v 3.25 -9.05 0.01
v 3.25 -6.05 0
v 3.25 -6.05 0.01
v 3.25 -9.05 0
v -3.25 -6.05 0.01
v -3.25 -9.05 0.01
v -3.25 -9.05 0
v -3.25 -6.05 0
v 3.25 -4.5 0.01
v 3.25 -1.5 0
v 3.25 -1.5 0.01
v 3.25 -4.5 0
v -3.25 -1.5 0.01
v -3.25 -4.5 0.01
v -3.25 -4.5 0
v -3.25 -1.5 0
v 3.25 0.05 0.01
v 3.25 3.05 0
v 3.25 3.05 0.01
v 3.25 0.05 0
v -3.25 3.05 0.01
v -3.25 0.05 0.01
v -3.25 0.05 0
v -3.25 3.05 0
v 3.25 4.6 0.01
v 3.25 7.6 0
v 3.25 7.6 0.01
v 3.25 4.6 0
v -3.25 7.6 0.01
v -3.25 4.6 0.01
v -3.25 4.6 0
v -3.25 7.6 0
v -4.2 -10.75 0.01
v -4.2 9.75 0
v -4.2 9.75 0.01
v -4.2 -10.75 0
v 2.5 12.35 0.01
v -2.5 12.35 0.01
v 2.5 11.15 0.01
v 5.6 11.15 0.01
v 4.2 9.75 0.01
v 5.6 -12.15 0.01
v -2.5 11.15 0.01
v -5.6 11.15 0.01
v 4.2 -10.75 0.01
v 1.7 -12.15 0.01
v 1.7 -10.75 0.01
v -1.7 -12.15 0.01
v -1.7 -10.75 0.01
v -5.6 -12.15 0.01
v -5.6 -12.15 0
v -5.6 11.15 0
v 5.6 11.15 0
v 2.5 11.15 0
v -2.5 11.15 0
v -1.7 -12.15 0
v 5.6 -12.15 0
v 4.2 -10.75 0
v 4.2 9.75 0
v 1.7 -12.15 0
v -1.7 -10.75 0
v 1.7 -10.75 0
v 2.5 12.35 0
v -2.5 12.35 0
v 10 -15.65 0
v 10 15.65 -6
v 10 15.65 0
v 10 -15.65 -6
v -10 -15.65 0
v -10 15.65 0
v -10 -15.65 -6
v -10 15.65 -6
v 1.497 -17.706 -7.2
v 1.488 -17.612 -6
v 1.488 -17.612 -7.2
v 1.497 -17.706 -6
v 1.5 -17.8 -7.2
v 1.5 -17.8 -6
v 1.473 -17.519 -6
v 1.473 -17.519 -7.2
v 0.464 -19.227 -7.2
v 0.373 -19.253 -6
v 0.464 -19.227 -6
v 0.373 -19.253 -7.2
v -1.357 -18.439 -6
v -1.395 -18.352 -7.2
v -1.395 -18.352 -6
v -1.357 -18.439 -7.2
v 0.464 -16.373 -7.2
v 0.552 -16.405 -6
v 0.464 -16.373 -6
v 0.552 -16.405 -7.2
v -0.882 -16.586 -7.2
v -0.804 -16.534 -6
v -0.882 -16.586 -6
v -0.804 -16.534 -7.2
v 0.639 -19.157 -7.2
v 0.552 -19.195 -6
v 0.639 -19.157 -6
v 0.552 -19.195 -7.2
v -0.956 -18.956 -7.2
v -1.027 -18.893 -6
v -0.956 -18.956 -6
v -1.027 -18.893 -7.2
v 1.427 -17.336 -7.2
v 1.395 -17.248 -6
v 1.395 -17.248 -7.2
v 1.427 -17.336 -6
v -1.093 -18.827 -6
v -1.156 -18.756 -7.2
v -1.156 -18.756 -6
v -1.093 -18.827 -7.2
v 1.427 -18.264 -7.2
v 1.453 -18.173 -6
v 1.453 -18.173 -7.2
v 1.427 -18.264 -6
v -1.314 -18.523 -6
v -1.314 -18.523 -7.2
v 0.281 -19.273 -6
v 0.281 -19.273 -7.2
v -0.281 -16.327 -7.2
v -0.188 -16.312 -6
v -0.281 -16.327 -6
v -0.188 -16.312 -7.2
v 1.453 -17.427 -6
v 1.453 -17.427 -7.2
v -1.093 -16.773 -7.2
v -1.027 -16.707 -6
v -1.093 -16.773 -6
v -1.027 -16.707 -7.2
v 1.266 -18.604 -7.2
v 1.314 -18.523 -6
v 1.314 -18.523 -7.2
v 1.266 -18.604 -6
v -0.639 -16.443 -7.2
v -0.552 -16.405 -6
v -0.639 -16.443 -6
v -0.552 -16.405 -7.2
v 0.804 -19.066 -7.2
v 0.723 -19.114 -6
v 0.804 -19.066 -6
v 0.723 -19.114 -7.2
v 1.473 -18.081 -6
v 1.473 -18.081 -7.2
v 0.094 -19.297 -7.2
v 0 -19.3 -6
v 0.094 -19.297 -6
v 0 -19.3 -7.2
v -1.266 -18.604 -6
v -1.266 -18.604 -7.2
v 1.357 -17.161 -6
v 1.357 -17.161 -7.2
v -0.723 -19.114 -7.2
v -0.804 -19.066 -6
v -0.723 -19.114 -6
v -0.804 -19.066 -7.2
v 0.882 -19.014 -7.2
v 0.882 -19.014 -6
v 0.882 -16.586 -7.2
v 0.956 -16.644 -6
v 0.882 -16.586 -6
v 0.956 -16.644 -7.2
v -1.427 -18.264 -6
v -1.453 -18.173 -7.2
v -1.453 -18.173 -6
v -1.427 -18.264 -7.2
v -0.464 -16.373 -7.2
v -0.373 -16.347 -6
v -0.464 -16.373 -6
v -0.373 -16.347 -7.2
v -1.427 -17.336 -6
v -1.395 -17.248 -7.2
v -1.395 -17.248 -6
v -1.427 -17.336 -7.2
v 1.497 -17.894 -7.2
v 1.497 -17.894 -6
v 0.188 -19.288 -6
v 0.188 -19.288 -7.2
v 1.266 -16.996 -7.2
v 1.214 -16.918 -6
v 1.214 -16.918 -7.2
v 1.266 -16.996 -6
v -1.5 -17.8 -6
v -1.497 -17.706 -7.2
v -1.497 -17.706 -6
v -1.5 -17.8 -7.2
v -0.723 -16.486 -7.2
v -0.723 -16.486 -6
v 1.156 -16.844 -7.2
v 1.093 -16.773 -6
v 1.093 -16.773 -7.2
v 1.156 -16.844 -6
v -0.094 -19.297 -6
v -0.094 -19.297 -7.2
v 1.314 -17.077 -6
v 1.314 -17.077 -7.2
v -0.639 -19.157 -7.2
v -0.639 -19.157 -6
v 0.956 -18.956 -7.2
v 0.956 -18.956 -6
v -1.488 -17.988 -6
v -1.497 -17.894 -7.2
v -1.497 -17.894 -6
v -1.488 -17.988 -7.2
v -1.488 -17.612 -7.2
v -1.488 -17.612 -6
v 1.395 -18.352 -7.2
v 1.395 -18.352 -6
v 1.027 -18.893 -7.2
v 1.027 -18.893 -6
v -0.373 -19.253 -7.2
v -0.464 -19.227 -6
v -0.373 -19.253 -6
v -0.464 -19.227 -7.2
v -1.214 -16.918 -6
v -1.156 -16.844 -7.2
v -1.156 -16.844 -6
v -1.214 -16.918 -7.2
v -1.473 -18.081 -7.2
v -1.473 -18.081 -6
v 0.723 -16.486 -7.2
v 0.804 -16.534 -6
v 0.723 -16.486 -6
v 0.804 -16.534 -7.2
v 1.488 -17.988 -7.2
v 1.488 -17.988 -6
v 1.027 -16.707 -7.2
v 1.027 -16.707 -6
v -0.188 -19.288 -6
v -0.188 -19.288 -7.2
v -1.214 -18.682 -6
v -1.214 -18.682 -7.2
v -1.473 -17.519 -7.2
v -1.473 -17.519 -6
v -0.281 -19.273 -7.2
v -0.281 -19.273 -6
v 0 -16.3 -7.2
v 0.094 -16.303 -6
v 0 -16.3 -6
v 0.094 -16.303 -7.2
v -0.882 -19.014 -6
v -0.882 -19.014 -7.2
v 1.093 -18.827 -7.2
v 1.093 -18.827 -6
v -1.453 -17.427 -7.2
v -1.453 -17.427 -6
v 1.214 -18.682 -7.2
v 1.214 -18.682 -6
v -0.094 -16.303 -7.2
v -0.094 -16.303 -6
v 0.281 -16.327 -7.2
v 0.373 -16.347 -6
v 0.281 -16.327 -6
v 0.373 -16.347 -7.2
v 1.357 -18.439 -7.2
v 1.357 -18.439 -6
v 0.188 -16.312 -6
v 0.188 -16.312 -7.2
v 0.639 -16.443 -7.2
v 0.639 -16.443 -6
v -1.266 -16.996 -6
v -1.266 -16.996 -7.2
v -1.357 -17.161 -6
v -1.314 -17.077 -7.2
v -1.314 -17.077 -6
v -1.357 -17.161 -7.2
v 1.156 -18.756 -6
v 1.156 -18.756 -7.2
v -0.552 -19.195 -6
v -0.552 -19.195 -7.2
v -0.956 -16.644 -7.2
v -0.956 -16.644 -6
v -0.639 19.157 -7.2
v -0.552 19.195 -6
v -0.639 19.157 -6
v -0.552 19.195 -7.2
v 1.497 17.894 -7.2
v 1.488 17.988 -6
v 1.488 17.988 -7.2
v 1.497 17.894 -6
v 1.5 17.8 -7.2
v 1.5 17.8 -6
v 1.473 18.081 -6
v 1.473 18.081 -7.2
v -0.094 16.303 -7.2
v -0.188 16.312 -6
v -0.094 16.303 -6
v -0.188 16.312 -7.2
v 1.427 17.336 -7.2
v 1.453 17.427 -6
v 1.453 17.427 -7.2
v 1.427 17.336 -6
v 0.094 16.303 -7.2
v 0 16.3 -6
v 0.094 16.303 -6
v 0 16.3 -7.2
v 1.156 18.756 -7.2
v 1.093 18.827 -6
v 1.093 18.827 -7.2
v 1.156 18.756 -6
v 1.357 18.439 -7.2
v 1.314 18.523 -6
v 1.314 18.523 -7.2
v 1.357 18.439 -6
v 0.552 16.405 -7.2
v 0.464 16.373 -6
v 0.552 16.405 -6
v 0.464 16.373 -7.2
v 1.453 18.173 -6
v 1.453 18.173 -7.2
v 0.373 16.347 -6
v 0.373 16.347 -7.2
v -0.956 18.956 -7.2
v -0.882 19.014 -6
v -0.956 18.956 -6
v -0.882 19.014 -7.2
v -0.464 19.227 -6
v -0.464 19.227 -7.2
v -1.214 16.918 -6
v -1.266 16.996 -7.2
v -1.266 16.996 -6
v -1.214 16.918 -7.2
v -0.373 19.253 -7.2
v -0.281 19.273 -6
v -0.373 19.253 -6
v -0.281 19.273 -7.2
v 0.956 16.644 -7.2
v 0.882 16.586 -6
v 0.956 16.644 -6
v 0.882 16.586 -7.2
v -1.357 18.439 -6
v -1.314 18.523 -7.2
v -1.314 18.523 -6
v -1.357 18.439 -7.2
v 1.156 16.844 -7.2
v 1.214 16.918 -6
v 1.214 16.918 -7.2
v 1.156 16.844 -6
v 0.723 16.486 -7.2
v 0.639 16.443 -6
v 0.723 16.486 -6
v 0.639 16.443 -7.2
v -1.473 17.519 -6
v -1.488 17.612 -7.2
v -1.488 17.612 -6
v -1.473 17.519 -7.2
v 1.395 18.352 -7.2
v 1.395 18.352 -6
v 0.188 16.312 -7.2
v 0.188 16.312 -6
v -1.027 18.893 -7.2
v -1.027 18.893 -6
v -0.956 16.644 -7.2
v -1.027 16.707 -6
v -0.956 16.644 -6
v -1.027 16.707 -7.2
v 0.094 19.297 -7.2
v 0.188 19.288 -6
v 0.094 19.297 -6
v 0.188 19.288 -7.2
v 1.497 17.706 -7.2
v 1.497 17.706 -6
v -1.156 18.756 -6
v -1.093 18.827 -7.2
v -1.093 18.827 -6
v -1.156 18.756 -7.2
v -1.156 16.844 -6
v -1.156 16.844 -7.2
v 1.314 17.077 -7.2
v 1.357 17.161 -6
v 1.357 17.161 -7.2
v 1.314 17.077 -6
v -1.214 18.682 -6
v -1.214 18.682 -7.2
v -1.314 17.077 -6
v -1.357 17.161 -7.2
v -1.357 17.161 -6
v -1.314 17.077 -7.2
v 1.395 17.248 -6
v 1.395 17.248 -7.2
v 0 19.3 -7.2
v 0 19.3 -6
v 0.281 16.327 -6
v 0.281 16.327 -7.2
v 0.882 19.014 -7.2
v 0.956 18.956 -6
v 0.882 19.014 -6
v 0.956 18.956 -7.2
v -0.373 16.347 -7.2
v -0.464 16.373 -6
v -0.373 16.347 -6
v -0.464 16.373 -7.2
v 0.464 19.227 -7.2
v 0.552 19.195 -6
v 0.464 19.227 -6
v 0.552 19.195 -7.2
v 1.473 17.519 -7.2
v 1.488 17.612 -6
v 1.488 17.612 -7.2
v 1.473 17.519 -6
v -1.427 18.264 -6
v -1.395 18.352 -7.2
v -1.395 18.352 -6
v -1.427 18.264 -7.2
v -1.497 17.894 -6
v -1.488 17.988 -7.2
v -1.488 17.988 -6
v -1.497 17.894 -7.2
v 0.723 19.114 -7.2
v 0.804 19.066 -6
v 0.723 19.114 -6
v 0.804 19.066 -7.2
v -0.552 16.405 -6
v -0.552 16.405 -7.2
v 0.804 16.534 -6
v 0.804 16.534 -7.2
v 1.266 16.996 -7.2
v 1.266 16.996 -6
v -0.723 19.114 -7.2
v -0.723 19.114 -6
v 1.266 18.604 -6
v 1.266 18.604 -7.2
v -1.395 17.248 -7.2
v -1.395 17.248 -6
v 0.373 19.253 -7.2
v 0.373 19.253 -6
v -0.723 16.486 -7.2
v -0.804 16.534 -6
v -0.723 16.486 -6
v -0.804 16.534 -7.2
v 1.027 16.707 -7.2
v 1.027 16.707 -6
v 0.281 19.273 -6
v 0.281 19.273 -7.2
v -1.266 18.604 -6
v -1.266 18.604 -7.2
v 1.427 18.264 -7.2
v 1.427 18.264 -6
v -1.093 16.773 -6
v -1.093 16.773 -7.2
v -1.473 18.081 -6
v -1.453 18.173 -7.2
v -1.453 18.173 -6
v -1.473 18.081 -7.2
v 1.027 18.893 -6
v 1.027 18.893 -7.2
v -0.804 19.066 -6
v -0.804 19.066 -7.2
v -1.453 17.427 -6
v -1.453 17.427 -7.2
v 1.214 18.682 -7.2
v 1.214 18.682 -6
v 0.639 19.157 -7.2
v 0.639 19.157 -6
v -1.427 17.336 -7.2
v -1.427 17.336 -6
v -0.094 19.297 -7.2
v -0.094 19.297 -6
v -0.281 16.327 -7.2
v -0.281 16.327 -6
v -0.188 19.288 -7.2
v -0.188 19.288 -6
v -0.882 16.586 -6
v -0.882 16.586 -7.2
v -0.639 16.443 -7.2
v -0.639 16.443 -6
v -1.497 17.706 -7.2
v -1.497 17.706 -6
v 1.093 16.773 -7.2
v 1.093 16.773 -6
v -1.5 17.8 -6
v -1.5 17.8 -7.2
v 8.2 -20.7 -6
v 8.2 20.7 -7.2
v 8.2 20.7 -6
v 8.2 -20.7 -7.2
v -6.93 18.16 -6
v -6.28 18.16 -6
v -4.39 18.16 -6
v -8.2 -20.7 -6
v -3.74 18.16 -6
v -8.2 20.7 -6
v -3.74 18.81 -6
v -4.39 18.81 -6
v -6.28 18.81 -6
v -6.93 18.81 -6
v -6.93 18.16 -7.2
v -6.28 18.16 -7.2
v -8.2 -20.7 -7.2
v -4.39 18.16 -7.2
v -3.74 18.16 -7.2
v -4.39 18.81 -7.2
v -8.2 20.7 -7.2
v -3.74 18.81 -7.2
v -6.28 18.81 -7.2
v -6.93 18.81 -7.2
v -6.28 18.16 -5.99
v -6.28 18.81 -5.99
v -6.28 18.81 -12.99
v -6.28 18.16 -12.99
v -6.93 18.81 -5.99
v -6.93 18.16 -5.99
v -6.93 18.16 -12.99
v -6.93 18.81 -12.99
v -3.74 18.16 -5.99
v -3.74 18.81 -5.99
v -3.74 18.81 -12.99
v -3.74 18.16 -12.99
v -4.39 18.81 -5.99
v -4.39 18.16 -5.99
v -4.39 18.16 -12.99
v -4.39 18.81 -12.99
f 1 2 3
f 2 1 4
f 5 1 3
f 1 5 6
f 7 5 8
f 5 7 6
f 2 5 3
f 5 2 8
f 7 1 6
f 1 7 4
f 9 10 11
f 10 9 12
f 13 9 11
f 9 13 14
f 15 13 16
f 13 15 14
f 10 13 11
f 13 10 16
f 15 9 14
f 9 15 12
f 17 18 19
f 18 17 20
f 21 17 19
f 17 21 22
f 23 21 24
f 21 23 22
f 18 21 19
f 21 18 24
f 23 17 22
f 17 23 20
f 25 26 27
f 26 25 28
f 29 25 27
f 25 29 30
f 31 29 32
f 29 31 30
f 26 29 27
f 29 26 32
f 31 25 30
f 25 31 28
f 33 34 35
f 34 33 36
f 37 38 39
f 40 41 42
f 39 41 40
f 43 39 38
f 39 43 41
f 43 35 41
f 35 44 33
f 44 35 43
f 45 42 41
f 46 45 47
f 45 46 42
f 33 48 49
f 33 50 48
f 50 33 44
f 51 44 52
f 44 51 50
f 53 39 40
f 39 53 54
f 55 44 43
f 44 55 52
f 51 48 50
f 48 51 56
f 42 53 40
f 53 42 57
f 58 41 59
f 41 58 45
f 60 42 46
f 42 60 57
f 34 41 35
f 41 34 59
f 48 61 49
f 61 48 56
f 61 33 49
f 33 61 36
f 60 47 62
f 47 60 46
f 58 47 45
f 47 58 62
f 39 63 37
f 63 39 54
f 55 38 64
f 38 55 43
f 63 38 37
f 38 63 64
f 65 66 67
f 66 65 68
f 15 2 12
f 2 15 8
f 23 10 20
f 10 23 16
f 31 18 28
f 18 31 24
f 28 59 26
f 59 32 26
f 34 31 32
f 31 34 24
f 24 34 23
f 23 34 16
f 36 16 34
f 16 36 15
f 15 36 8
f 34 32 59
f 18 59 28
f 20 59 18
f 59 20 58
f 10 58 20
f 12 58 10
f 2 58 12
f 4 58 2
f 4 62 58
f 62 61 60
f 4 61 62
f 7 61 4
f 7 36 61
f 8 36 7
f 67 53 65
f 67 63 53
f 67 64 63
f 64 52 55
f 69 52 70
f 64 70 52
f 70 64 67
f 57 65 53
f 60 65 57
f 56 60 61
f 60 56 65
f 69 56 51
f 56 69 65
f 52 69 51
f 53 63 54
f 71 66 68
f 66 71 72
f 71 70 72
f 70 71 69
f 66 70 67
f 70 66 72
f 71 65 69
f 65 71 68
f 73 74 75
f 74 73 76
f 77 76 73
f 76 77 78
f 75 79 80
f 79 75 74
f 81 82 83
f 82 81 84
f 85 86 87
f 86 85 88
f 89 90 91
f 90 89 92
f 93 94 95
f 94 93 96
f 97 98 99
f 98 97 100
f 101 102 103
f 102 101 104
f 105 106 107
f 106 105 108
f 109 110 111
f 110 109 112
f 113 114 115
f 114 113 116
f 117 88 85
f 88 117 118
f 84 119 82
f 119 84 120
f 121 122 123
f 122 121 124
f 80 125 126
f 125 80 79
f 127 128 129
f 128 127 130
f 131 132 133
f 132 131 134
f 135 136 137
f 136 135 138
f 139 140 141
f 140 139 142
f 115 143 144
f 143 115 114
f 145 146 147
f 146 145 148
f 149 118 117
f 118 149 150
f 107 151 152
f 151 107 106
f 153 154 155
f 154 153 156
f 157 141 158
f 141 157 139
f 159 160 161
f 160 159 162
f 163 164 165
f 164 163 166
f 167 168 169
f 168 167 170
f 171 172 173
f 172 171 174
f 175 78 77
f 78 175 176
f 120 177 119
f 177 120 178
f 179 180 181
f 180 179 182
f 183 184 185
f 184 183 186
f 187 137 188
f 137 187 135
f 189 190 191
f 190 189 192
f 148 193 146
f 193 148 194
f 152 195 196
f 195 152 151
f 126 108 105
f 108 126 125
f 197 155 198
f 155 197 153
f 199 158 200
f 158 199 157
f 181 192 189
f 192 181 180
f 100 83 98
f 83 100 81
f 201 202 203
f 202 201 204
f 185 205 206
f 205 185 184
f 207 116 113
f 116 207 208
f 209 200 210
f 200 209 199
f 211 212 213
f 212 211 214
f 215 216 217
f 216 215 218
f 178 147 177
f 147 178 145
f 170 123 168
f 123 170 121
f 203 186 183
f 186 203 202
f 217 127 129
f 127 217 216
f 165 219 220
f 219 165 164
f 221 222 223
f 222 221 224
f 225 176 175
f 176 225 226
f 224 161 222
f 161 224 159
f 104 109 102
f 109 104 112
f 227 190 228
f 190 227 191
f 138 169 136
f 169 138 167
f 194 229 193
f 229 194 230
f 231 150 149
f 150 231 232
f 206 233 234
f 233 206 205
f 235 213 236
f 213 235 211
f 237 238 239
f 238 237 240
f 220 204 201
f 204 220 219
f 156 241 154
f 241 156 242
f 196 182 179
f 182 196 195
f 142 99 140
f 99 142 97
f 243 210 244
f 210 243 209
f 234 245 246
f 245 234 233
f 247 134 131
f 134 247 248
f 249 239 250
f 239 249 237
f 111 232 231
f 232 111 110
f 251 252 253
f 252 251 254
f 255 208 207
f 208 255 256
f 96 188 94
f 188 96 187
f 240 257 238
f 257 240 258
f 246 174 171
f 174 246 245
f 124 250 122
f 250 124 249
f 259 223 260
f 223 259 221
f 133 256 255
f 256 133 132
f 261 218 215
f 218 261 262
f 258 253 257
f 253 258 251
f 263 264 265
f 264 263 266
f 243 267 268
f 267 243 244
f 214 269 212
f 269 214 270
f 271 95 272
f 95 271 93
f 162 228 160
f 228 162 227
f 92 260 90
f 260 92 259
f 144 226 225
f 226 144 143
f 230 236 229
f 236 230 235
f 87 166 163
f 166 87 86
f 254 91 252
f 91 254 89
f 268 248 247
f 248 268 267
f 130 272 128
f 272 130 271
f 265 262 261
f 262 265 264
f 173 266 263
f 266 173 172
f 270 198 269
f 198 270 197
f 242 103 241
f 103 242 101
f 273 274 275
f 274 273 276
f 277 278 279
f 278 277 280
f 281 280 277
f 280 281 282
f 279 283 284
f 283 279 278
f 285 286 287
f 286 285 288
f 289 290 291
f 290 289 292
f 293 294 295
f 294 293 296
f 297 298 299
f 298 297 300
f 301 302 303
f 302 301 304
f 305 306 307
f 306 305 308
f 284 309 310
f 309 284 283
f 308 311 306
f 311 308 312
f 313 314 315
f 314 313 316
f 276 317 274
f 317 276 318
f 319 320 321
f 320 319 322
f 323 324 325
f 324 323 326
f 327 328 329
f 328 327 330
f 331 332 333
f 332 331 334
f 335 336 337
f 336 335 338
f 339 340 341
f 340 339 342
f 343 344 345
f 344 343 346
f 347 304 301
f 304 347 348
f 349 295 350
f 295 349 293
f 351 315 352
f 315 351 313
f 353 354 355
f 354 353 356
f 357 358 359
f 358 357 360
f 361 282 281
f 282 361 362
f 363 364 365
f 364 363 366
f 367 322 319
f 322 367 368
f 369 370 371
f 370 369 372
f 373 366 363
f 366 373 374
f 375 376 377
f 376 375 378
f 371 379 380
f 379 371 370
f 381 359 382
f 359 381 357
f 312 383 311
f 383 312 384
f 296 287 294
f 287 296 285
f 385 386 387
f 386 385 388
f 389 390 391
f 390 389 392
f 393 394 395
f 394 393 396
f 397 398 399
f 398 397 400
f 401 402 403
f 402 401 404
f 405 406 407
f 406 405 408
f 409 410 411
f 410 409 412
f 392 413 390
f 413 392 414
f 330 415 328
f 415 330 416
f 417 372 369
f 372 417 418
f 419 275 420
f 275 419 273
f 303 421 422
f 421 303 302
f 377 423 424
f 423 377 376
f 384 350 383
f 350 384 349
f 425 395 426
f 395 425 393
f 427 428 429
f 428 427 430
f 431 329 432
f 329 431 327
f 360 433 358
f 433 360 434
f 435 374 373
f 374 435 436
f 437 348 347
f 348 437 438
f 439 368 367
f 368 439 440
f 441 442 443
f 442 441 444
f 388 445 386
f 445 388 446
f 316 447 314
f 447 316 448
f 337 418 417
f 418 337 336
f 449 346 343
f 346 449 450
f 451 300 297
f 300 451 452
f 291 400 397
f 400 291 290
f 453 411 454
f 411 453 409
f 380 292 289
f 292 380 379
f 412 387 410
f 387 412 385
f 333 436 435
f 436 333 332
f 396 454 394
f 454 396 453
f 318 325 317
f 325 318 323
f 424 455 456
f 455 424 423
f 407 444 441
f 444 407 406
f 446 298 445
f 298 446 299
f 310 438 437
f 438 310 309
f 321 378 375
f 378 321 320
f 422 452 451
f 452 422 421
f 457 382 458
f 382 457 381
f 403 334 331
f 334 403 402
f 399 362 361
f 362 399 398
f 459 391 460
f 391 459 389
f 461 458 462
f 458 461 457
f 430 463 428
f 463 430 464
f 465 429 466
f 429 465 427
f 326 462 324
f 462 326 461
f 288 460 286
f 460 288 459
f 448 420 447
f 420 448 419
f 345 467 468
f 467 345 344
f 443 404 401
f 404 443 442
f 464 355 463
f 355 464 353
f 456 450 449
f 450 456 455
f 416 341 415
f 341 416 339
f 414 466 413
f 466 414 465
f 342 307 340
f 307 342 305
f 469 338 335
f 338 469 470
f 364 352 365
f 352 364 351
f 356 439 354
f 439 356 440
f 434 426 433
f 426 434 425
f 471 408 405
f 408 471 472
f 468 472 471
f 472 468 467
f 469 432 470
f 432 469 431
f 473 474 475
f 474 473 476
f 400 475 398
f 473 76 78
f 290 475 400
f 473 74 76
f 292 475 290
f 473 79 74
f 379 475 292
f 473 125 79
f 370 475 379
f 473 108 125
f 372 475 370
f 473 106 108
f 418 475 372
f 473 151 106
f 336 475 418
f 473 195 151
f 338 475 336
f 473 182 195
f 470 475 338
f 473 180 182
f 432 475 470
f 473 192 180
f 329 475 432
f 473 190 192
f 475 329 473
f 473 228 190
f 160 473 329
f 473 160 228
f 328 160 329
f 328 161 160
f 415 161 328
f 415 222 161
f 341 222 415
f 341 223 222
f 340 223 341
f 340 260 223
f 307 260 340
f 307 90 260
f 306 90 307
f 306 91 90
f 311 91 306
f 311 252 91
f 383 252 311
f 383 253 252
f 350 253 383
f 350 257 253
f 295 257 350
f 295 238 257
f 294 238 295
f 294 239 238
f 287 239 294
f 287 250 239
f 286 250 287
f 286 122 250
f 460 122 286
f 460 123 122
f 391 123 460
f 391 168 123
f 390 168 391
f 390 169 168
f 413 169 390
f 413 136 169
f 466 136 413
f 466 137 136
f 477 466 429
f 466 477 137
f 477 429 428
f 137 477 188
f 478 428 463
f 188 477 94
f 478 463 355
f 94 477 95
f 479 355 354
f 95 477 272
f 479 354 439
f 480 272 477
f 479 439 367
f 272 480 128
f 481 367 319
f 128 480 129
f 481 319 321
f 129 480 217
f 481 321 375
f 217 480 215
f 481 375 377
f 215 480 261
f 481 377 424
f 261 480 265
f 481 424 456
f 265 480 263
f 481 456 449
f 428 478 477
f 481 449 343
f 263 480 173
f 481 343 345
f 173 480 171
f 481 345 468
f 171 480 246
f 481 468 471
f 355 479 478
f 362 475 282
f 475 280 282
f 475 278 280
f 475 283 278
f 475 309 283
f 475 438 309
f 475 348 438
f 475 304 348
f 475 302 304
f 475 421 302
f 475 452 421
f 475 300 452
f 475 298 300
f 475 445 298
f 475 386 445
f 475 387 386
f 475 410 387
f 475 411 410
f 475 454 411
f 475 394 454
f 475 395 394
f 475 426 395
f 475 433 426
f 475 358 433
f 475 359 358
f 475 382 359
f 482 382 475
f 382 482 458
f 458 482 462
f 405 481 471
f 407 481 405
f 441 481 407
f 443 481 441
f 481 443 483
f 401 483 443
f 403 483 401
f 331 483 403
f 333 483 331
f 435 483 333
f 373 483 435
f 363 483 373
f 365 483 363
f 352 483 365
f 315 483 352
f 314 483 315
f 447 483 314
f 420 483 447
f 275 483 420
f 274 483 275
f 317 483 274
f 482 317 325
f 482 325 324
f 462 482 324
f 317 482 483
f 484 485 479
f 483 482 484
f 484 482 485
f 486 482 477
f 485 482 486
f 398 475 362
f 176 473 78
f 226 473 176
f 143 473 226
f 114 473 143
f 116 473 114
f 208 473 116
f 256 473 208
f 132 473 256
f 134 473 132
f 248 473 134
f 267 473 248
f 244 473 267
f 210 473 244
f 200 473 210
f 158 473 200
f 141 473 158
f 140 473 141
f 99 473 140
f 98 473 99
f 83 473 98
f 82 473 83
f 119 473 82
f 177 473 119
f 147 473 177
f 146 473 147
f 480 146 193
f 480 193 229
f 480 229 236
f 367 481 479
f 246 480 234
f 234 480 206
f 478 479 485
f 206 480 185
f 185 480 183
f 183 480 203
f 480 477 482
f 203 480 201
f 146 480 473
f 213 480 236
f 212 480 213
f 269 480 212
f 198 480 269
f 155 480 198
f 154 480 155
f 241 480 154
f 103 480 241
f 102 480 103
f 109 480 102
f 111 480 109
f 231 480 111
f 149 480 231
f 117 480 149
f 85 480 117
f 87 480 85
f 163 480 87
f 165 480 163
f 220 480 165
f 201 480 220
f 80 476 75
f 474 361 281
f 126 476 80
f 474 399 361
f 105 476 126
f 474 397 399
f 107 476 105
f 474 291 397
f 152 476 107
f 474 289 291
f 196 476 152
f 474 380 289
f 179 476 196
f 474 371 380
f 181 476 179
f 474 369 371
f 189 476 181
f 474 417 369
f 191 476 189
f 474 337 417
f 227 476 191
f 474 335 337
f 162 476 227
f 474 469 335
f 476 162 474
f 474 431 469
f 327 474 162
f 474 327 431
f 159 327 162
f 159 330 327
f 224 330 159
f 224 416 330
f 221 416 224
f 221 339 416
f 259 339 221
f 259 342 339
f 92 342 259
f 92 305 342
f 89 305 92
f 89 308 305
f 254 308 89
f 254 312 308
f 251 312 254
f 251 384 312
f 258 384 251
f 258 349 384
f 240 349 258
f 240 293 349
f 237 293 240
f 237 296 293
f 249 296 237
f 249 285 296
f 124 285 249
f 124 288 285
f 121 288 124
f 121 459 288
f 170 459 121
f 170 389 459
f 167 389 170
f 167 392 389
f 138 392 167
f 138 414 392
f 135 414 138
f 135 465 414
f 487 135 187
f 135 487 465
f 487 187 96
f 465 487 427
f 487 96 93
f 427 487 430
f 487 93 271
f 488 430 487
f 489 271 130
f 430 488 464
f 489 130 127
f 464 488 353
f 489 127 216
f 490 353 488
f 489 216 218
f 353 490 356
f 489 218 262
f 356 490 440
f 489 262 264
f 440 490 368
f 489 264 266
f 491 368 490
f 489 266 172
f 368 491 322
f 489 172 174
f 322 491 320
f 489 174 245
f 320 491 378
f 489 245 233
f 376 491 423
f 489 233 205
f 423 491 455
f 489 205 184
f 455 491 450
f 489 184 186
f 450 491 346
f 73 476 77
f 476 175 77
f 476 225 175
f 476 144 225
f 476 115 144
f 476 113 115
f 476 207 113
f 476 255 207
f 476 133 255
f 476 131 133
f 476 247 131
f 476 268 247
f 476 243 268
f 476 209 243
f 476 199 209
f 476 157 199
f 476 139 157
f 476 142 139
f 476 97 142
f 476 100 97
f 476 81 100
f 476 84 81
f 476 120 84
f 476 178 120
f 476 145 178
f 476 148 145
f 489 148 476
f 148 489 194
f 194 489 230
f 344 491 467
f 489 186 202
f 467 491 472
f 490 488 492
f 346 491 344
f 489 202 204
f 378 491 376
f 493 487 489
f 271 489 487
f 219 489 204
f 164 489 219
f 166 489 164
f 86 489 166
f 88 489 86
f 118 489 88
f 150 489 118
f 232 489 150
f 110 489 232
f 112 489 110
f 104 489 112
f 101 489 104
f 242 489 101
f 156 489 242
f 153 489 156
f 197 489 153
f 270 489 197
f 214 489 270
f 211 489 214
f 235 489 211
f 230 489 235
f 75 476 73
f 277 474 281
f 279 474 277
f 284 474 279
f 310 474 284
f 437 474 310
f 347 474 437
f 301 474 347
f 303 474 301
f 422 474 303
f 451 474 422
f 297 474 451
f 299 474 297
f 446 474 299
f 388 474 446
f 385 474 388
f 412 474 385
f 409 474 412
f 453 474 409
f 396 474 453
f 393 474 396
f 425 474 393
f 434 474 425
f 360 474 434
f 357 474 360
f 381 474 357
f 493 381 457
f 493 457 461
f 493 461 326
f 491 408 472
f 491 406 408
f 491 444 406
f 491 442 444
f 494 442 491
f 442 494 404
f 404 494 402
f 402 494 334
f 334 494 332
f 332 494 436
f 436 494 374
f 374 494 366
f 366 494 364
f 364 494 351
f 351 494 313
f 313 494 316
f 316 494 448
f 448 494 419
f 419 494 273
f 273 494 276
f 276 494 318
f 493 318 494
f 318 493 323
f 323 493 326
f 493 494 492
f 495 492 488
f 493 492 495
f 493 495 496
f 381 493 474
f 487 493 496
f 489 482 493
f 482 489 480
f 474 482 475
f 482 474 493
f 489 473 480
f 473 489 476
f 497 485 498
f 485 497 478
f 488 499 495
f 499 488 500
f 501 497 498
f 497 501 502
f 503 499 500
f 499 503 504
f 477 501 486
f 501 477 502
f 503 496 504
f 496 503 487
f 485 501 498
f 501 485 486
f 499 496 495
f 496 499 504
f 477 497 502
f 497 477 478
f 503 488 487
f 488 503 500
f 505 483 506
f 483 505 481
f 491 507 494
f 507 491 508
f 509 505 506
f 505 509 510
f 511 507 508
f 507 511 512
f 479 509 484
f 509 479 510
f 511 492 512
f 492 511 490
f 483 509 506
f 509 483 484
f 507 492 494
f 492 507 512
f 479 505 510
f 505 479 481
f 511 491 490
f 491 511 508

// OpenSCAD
$fn = 100;

Size = [20, 31.3, 6];

Bar_Width = 6.5;
Bar_Height = 3;
Bars_Bottom = 6.6;
Bars_Gap = 1.55;
Outline_Width = 1.4;
Outline_Bottom = 3.5;
Outline_Bottom_Gap = 3.4;
Outline_Top = 4.5;
Outline_Side = 4.4;
Cap_Size = [5, 2.6];
Board_Size = [16.4, 41.4, 1.2];
Board_Holes_Offset = 17.8;
Board_Holes_Diameter = 2;

Bar_Colors = ["#00F", "#00F", "#00F", "#999"];
Border_Color = "#F00";
Board_Color = "#040";

Pin_Grid = 2.54;
Pin_Size = 0.65;
Pin_Length = 7;

e = 0.01;

BatteryIndicator("#999");

module BatteryIndicator(metal_color, negative = false) {
  translate([-Size[0] / 2, -Size[1] / 2, -Size[2]]) {
    color("#000")
      difference() {
        cube(Size);
        if (!negative)
          bat();
      }
    bat();
    // Battery Board
    translate([(Size[0] - Board_Size[0]) / 2, (Size[1] - Board_Size[1]) / 2, -Board_Size[2]]) {
      difference() {
        color(Board_Color)
          cube(Board_Size);
        for (y = [-1, 1]) {
          translate([Board_Size[0] / 2, Board_Size[1] / 2 + y * Board_Holes_Offset, -e/2])
            cylinder(h = Board_Size[2] + e, d = 3);
        }
      }
      color(metal_color) {
        // Pins
        for (i = [0 : 1]) {
          translate([Pin_Grid * (i + 0.5), Board_Size[1] - Pin_Grid, Board_Size[2] - Pin_Length + e])
            cube([Pin_Size, Pin_Size, Pin_Length]);
        }
      }
    }
  }
}

module bat() {
  translate([0, 0, e]) {
    // Bars
    for (i = [0 : 3]) {
      color(Bar_Colors[i])
        translate([(Size[0] - Bar_Width) / 2, Bars_Bottom + i * (Bar_Height + Bars_Gap), 0])
          cube([Bar_Width, Bar_Height, Size[2]]);
    }
    color(Border_Color) {
      // Outline Left/Right
      translate([Outline_Side, Outline_Bottom, 0])
        cube([Outline_Width, Size[1] - Outline_Top - Outline_Bottom, Size[2]]);
      translate([Size[0] - Outline_Side - Outline_Width, Outline_Bottom, 0])
        cube([Outline_Width, Size[1] - Outline_Top - Outline_Bottom, Size[2]]);
      // Outline Top
      translate([Outline_Side, Size[1] - Outline_Top - Outline_Width, 0])
        cube([Size[0] - Outline_Side * 2, Outline_Width, Size[2]]);
      // Outline Bottom
      translate([Outline_Side, Outline_Bottom, 0])
        cube([Size[0] / 2 - Outline_Side - Outline_Bottom_Gap / 2, Outline_Width, Size[2]]);
      translate([Size[0] / 2 + Outline_Bottom_Gap / 2, Outline_Bottom, 0])
        cube([Size[0] / 2 - Outline_Side - Outline_Bottom_Gap / 2, Outline_Width, Size[2]]);
      // Cap
      translate([(Size[0] - Cap_Size[0]) / 2, Size[1] - Outline_Top - Outline_Width, 0])
        cube([Cap_Size[0], Cap_Size[1], Size[2]]);
    }
  }
}
